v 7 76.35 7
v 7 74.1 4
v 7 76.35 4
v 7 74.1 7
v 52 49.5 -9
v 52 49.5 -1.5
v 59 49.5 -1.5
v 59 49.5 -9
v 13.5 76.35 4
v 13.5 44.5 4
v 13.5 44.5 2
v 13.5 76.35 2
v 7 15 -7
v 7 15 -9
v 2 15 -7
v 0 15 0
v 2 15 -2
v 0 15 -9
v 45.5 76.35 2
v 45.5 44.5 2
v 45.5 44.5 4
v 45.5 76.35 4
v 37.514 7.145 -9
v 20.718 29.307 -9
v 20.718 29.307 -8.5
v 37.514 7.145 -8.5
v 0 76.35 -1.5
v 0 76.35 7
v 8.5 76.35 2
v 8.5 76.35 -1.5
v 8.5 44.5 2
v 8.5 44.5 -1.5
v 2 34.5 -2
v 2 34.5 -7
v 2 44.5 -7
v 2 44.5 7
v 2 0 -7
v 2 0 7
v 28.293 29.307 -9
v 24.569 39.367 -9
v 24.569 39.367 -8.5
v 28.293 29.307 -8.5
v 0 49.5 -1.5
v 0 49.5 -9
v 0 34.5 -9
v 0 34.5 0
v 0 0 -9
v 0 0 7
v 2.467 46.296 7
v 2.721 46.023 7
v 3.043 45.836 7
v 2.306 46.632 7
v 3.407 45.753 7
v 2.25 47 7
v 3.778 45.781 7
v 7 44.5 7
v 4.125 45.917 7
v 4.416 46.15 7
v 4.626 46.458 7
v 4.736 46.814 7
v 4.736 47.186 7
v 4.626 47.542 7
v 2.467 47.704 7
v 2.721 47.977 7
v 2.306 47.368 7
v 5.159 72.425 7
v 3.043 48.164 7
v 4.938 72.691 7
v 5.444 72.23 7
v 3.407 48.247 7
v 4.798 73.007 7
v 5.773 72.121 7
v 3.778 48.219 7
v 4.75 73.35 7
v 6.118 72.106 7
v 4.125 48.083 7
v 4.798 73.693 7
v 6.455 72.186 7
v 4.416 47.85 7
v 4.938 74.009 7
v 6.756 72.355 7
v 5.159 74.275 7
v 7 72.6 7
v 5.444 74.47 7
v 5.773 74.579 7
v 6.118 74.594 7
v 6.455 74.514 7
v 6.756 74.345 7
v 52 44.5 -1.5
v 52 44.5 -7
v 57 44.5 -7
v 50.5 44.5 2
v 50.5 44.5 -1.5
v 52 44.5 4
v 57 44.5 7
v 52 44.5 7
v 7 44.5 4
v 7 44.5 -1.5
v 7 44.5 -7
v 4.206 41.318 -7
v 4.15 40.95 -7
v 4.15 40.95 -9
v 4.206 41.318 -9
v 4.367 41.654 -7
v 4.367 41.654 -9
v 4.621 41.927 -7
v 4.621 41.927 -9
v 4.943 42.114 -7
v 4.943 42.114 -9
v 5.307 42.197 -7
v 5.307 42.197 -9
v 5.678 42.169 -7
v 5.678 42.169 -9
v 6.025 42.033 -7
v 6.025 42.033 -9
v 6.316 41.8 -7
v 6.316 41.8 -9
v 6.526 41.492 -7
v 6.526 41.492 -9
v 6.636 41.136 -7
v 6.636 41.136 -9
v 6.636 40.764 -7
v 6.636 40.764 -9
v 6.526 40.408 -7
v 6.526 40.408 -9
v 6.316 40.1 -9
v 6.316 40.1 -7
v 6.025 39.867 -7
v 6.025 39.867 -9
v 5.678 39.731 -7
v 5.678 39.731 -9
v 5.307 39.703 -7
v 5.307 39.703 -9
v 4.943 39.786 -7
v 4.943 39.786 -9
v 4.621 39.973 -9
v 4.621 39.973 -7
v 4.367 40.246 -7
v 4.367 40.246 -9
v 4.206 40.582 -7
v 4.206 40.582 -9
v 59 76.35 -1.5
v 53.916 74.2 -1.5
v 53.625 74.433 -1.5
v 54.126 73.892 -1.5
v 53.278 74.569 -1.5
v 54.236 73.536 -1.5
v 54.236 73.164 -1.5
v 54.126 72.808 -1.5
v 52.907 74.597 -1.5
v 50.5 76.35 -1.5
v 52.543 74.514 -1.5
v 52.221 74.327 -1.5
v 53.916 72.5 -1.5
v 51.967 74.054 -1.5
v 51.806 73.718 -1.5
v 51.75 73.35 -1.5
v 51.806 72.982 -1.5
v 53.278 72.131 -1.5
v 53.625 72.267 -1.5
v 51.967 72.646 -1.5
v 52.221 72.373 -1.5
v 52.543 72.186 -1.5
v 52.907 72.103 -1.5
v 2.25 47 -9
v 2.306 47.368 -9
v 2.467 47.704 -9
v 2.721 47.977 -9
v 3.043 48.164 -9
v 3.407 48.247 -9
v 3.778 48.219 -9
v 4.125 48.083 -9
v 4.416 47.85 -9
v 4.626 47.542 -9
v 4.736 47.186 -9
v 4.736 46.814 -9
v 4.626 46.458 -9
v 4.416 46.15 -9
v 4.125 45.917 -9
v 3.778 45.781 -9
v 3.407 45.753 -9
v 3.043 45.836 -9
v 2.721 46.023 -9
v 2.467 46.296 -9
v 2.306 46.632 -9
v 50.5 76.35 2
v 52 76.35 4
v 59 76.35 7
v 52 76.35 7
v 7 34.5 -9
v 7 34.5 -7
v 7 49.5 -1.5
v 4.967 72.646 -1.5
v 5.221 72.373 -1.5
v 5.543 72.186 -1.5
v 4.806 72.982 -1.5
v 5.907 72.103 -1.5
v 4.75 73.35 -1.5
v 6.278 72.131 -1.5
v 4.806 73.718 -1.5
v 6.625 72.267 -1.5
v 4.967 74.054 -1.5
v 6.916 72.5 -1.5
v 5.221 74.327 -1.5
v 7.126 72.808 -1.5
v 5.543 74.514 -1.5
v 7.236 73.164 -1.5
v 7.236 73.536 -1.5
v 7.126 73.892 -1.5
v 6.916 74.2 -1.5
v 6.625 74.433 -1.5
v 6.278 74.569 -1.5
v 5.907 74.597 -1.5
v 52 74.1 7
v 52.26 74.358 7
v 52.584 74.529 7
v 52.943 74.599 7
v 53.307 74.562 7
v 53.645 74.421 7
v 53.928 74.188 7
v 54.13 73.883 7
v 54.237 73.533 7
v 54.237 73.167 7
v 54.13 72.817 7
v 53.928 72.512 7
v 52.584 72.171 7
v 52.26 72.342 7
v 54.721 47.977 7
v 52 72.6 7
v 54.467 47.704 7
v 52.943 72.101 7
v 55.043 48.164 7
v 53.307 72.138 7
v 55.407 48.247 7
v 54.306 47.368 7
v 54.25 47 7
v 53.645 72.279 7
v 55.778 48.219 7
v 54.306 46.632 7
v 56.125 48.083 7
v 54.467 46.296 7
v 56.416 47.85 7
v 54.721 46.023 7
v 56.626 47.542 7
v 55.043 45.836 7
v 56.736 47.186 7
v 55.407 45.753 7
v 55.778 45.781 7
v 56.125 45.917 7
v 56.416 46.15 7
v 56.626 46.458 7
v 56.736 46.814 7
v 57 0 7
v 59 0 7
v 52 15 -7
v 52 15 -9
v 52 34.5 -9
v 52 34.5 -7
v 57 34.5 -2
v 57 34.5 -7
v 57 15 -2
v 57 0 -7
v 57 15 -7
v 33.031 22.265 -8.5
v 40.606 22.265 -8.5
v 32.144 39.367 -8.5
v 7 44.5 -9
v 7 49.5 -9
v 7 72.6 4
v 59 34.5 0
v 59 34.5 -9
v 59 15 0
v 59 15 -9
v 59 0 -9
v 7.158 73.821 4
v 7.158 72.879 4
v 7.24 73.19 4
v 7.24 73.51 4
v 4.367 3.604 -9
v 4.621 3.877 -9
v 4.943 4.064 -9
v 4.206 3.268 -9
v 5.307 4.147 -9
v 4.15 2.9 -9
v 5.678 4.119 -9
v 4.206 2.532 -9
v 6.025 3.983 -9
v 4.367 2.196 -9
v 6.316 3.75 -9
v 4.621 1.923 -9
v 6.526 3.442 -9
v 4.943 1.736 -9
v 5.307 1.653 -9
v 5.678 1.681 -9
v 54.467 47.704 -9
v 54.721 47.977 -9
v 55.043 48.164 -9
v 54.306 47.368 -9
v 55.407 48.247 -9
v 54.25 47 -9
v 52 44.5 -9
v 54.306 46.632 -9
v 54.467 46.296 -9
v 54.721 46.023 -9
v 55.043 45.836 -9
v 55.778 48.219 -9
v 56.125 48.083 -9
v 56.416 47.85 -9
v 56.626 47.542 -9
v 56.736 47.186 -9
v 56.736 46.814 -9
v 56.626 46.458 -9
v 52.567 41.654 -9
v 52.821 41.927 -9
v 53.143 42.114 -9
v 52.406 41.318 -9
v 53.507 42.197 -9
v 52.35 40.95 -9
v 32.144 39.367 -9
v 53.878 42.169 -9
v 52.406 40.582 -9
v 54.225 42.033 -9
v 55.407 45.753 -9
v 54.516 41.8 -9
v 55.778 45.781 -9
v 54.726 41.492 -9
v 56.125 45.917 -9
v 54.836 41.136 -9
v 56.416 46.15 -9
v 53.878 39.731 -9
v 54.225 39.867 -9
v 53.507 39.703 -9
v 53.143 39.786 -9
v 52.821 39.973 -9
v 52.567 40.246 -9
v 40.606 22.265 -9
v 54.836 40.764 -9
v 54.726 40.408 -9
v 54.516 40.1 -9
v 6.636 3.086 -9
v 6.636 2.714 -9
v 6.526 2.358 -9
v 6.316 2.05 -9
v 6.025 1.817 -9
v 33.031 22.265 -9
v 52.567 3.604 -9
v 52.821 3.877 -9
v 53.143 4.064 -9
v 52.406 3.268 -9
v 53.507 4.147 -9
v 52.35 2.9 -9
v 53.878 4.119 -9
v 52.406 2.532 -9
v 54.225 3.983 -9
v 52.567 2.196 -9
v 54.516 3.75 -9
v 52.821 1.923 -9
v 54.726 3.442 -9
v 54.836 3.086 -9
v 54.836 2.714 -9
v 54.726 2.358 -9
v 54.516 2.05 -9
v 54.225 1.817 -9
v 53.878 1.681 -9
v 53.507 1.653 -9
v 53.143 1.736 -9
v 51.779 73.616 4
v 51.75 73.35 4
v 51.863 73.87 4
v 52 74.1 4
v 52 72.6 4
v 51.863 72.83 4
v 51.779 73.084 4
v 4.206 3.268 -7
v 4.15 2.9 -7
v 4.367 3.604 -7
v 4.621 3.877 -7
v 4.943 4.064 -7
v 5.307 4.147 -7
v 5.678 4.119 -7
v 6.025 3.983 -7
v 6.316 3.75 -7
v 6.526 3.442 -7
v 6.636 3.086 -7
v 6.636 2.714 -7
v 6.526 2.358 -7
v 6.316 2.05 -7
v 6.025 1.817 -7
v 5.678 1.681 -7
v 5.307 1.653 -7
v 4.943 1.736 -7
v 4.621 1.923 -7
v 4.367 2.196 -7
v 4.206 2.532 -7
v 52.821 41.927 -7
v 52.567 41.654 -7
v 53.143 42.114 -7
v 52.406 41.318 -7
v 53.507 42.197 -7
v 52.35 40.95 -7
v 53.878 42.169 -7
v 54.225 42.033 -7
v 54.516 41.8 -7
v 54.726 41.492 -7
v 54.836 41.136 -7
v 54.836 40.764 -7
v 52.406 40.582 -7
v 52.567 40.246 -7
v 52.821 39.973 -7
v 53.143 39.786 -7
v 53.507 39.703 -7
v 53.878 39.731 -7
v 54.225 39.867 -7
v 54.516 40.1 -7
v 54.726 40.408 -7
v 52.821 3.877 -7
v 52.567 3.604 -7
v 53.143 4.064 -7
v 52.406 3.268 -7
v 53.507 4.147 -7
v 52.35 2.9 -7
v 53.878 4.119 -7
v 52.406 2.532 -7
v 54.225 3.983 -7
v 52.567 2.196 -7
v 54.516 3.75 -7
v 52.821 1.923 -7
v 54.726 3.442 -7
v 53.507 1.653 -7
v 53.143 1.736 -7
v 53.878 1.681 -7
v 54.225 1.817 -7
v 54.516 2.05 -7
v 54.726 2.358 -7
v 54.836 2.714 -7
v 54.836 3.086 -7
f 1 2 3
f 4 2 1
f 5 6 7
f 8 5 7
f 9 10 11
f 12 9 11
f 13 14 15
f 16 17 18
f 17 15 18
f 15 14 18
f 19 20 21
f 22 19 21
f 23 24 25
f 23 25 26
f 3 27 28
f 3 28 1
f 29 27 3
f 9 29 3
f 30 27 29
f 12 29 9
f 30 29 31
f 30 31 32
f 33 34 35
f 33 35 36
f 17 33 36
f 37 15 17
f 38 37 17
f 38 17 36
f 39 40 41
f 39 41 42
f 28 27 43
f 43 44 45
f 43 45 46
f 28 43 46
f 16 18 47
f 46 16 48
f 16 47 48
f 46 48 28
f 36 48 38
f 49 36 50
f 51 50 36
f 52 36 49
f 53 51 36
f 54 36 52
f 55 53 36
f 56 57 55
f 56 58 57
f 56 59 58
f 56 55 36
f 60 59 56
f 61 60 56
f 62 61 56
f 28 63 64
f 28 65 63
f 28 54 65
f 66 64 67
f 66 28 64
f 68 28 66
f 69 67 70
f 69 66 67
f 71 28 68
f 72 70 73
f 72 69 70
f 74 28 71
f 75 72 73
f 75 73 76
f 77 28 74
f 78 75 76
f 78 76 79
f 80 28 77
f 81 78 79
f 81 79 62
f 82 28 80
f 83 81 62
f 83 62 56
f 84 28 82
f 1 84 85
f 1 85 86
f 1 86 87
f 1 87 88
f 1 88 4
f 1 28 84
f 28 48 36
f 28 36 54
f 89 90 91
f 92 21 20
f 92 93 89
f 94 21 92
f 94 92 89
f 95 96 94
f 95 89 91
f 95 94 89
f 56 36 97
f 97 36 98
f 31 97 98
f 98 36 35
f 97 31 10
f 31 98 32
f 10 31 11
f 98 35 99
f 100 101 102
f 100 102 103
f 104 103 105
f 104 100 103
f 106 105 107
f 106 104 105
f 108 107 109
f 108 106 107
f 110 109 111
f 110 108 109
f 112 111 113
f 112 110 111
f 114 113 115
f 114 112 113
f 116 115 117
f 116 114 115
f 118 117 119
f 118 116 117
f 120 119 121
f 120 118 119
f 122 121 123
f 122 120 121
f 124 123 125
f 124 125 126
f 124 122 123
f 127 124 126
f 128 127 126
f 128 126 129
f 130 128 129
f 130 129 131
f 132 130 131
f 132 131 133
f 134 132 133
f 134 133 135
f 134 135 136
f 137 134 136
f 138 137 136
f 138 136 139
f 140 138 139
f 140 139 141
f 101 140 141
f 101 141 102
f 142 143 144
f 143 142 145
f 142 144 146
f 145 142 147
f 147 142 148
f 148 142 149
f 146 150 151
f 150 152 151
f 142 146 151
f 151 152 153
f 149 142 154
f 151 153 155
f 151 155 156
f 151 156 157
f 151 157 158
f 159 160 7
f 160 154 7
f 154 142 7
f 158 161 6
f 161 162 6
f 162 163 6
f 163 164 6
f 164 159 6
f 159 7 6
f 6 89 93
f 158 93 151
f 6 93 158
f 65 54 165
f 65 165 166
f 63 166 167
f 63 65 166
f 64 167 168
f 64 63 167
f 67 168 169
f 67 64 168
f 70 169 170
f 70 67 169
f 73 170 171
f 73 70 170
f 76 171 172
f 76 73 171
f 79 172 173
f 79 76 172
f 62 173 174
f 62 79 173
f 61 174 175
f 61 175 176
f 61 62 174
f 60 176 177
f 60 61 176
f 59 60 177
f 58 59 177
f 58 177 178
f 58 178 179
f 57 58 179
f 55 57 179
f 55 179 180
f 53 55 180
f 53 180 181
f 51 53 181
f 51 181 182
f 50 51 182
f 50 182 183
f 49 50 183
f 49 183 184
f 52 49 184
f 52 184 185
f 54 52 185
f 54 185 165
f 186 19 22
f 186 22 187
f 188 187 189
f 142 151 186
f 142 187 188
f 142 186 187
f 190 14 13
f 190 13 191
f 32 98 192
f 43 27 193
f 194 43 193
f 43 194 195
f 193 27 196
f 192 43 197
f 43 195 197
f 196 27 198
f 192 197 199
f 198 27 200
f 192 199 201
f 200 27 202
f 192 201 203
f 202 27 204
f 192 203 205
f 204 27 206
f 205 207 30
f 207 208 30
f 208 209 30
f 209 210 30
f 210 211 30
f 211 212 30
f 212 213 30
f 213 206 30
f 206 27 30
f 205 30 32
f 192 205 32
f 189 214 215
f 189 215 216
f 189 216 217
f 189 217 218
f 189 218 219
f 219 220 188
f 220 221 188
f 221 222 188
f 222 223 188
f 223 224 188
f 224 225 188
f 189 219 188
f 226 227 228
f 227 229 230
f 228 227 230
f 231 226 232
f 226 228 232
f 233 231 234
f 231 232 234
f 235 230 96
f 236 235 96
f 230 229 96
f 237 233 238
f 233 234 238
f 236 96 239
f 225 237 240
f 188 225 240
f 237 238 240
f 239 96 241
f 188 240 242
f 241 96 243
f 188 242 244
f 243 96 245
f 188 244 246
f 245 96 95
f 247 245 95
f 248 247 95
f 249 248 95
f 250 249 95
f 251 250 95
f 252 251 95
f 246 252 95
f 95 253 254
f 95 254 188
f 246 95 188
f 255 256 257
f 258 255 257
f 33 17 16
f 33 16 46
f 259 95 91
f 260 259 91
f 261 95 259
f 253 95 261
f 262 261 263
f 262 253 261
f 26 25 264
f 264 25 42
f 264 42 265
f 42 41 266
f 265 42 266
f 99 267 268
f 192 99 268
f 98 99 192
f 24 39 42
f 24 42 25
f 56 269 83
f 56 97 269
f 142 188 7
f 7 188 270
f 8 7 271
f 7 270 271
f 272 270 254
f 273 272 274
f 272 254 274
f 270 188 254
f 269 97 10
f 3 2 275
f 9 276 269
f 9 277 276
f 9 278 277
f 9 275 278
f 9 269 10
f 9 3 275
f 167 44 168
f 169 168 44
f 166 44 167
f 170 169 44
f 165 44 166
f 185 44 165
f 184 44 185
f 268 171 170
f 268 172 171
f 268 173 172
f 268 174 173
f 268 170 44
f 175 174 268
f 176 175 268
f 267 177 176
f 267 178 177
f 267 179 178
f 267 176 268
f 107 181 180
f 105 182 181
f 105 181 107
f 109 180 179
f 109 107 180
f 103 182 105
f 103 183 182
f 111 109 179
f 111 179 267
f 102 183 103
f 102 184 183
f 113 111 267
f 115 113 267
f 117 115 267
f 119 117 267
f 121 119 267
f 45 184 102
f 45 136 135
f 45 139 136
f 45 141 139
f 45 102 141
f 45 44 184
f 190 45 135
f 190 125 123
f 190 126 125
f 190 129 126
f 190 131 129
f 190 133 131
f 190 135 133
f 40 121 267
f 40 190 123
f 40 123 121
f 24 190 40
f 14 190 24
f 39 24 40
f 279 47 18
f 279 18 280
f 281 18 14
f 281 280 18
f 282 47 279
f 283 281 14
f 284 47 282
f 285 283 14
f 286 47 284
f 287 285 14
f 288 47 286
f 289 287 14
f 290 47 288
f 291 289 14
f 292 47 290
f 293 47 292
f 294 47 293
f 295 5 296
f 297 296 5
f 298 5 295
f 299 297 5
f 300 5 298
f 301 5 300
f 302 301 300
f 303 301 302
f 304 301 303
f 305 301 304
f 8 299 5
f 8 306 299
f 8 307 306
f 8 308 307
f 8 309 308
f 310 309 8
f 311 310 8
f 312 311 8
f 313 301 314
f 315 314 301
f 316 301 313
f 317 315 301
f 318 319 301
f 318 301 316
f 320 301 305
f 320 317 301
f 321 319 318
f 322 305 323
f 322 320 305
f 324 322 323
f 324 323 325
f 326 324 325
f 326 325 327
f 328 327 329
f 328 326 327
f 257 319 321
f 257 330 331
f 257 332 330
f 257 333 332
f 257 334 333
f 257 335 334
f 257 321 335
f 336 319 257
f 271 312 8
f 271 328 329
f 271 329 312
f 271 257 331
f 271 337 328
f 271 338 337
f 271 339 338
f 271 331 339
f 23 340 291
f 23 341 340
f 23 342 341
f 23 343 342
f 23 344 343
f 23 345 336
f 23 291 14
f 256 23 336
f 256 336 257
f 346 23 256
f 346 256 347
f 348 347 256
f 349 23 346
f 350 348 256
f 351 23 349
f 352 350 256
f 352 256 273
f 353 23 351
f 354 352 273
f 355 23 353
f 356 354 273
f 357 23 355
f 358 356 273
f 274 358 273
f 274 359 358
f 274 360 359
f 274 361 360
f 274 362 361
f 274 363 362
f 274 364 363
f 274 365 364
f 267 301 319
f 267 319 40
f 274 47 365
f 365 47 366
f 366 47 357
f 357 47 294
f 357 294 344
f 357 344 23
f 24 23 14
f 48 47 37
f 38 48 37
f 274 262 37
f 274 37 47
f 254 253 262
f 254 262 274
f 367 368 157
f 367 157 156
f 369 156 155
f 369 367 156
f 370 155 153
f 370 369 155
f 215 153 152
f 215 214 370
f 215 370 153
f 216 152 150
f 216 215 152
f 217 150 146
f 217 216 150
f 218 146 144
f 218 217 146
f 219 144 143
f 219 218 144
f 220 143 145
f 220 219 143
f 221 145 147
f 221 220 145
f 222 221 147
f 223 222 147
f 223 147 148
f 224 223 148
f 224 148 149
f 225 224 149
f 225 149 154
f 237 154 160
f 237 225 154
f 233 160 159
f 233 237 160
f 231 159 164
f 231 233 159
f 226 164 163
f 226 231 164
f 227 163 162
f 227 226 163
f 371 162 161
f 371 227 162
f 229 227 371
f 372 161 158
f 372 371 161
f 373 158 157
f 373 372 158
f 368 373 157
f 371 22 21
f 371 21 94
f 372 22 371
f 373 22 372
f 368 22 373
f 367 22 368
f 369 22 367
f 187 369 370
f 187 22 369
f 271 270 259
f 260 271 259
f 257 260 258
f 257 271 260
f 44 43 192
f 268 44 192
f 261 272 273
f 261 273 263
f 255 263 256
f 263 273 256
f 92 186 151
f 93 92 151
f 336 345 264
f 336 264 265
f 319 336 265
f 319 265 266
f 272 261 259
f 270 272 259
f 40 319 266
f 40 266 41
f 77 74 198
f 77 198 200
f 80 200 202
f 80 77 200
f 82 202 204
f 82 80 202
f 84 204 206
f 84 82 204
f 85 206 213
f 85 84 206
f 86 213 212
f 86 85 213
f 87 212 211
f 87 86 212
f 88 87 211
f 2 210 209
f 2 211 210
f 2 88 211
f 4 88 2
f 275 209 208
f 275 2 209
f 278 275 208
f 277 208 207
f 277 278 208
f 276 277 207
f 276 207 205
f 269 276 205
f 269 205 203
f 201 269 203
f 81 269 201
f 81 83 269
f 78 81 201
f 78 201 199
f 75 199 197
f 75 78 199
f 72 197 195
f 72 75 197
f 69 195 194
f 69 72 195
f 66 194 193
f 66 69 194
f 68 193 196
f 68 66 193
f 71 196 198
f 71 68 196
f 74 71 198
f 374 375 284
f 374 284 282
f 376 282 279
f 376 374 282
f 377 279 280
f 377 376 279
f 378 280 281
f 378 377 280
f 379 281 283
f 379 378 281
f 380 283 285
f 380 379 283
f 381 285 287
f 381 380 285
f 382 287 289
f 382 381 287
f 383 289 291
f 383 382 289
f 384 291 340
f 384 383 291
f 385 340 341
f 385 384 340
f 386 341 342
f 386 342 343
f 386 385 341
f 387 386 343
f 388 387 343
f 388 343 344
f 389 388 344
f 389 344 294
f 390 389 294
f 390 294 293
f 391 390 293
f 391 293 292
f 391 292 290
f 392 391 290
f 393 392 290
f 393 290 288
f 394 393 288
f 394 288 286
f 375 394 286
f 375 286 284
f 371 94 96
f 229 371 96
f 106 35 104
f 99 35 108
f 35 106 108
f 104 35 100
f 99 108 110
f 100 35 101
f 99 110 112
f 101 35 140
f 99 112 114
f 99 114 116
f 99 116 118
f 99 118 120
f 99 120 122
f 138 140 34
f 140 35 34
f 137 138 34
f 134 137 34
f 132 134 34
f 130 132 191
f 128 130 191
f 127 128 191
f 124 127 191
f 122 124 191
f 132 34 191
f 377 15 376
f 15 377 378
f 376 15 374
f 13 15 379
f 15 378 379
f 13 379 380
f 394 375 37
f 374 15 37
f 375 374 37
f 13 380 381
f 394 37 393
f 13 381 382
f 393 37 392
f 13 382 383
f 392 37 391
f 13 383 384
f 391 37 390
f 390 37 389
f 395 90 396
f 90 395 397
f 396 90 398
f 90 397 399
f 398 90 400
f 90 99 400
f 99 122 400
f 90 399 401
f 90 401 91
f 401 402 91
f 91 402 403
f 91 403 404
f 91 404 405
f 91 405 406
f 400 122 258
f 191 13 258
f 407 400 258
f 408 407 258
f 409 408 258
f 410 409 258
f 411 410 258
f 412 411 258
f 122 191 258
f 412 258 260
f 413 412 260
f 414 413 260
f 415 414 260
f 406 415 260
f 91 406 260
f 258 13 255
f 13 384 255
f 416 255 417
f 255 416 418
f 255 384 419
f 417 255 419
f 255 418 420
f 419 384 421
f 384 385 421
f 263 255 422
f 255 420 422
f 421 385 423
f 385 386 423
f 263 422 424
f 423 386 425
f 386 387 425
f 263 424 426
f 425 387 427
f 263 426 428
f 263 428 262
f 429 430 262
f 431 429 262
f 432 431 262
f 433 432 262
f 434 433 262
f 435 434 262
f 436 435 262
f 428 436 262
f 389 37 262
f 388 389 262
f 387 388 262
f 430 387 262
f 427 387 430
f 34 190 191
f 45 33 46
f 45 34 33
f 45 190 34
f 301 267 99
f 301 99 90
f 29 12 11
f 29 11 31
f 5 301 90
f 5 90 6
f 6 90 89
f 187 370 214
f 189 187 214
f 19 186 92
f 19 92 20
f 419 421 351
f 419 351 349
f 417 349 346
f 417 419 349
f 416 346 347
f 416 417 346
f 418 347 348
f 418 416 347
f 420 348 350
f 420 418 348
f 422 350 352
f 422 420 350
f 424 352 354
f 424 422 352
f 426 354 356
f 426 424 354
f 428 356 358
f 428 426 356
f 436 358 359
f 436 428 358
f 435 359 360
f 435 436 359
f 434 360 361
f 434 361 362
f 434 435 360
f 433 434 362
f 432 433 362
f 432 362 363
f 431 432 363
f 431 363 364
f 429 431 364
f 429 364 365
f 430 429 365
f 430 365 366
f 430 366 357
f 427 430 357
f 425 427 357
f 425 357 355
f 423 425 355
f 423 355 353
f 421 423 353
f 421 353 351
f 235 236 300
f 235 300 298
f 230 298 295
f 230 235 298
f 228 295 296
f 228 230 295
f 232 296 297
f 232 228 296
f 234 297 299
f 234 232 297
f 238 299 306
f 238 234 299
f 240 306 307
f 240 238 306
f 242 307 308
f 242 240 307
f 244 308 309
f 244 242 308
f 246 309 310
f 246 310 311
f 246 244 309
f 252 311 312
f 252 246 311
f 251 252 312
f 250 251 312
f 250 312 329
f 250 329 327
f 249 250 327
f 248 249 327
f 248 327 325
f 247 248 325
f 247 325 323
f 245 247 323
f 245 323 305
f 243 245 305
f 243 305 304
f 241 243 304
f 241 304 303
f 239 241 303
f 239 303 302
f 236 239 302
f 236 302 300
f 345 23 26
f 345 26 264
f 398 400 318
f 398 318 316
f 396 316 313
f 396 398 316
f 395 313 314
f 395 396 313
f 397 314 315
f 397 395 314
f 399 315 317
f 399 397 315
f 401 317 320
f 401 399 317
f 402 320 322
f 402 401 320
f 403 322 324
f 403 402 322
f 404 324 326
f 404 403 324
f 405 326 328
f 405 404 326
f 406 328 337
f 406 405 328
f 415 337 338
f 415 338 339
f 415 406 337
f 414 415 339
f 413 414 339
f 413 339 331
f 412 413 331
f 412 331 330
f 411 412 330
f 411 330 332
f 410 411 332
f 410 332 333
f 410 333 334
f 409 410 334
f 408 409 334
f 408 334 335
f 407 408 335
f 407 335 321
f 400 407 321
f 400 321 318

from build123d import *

# Parameters (mm, degrees)
BOSS_EXTRUDE1_DEPTH     = 44.5
SKETCH4_W               = 7
SKETCH4_H               = 9
BOSS_EXTRUDE3_DEPTH     = 5
SKETCH5_R               = 1.25
CUT_EXTRUDE3_DEPTH      = 78.538700015
BOSS_EXTRUDE4_DEPTH     = 3
SKETCH10_W              = 7
SKETCH10_H              = 19.5
CUT_EXTRUDE6_DEPTH      = 7
CHAMFER3_SIZE           = 2
CUT_EXTRUDE5_DEPTH      = 78.538700015
CUT_EXTRUDE5_DEPTH_BACK = 78.538700015
SKETCH9_W               = 59
SKETCH9_H               = 2
CUT_EXTRUDE7_DEPTH      = 0.5
SKETCH12_W              = 7
SKETCH12_H              = 2
SKETCH12_W_2            = 1.5
SKETCH12_H_2            = 3.5
SKETCH12_H_3            = 3
BOSS_EXTRUDE5_DEPTH     = 26.85
CUT_EXTRUDE4_START      = -16
CUT_EXTRUDE4_OUTLINE_R  = 1.25
CUT_EXTRUDE4_DEPTH      = 16
SKETCH12_4_W            = 1.5
SKETCH12_4_H            = 3.5
BOSS_EXTRUDE6_DEPTH     = 5


# Read off the part's stored shape, not the designer's step: Cut-Extrude4
with BuildPart() as part:
    # Sketch1 → Boss-Extrude1 (new body)
    with BuildSketch(Plane(origin=(0, 0, 0), x_dir=(1, 0, 0), z_dir=(0, 1, 0))):
        Polygon((0, 0), (2, 0), (2, 7), (57, 7), (57, 0), (59, 0), (59, 9), (0, 9), align=None)
    extrude(amount=BOSS_EXTRUDE1_DEPTH)

    # Sketch4 → Boss-Extrude3 (add)
    with BuildSketch(Plane(origin=(0, 44.5, 0), x_dir=(1, 0, 0), z_dir=(0, 1, 0))):
        with Locations((3.5, 4.5)):
            Rectangle(SKETCH4_W, SKETCH4_H)
        with Locations((55.5, 4.5)):
            Rectangle(SKETCH4_W, SKETCH4_H)
    extrude(amount=BOSS_EXTRUDE3_DEPTH)

    # Sketch5 → Cut-Extrude3 (cut, through all)
    with BuildSketch(Plane(origin=(0, 0, -9), x_dir=(-1, 0, 0), z_dir=(0, 0, -1))):
        with Locations((-55.5, 47)):
            Circle(SKETCH5_R)
        with Locations((-3.5, 47)):
            Circle(SKETCH5_R)
    extrude(amount=-CUT_EXTRUDE3_DEPTH, mode=Mode.SUBTRACT)

    # Sketch3 → Boss-Extrude4 (add)
    with BuildSketch(Plane(origin=(0, 0, -9), x_dir=(-1, 0, 0), z_dir=(0, 0, -1))):
        with BuildLine():
            ThreePointArc((1.75, 5), (1.184653197, 6.045825033), (0, 6.145643924))
            Line((0, 6.145643924), (0, 3.854356076))
            ThreePointArc((0, 3.854356076), (1.184653197, 3.954174967), (1.75, 5))
        make_face()
        with BuildLine():
            Line((-59, 3.854356076), (-59, 6.145643924))
            ThreePointArc((-59, 6.145643924), (-60.75, 5), (-59, 3.854356076))
        make_face()
    extrude(amount=BOSS_EXTRUDE4_DEPTH)


with BuildPart() as boss_extrude4_kept_piece:
    # of the separate pieces the step leaves, the one the design keeps (boss_extrude4_pieces_kept)
    add(part.part.solids().sort_by_distance((0, 49.5, 0))[0])

    # Mirror2: Boss-Extrude4 kept piece across plane


with BuildPart() as boss_extrude4_kept_piece_1:
    add(boss_extrude4_kept_piece.part)
    add(boss_extrude4_kept_piece.part.mirror(Plane.XY))

    # Sketch10 → Cut-Extrude6 (cut)
    with BuildSketch(Plane(origin=(0, 0, -9), x_dir=(-1, 0, 0), z_dir=(0, 0, -1))):
        with Locations((-55.5, 24.75)):
            Rectangle(SKETCH10_W, SKETCH10_H)
        with Locations((-3.5, 24.75)):
            Rectangle(SKETCH10_W, SKETCH10_H)
    extrude(amount=-CUT_EXTRUDE6_DEPTH, mode=Mode.SUBTRACT)

    # Chamfer3
    chamfer3_edges = [boss_extrude4_kept_piece_1.edges().sort_by_distance(p)[0] for p in [
        (0, 24.75, -2),
        (59, 24.75, -2),
    ]]
    chamfer(chamfer3_edges, length=CHAMFER3_SIZE - 0.0001)  # a hair under: the kernel refuses the full size

    # Sketch9 → Cut-Extrude5 (cut, two sides: drawn at the far end of the back side and taken through both)
    with BuildSketch(Plane.XZ.offset(-CUT_EXTRUDE5_DEPTH_BACK)):
        with Locations((29.5, 8)):
            Rectangle(SKETCH9_W, SKETCH9_H)
    extrude(amount=CUT_EXTRUDE5_DEPTH + CUT_EXTRUDE5_DEPTH_BACK, mode=Mode.SUBTRACT)

    # Sketch11 → Cut-Extrude7 (cut)
    with BuildSketch(Plane(origin=(0, 0, -9), x_dir=(-1, 0, 0), z_dir=(0, 0, -1))):
        Polygon((-32.1435681, 39.366852384), (-24.568842978, 39.366852384), (-28.293120049, 29.306670581), (-20.718394926, 29.306670581), (-37.51393239, 7.144924052), (-33.031231201, 22.264543319), (-40.605956323, 22.264543319), align=None)
    extrude(amount=-CUT_EXTRUDE7_DEPTH, mode=Mode.SUBTRACT)

    # Sketch12 → Boss-Extrude5 (add)
    with BuildSketch(Plane(origin=(0, 49.5, 0), x_dir=(1, 0, 0), z_dir=(0, 1, 0))):
        with Locations((55.5, -3)):
            Rectangle(SKETCH12_W, SKETCH12_H)
        Polygon((7, -2), (7, -4), (13.5, -4), (13.5, -2), (8.5, -2), align=None)
        Polygon((45.5, -2), (45.5, -4), (52, -4), (52, -2), (50.5, -2), align=None)
        with Locations((7.75, -0.25)):
            Rectangle(SKETCH12_W_2, SKETCH12_H_2)
        with Locations((3.5, -0.25)):
            Rectangle(SKETCH12_W, SKETCH12_H_2)
        with Locations((51.25, -0.25)):
            Rectangle(SKETCH12_W_2, SKETCH12_H_2)
        with Locations((55.5, -0.25)):
            Rectangle(SKETCH12_W, SKETCH12_H_2)
        with Locations((3.5, -3)):
            Rectangle(SKETCH12_W, SKETCH12_H)
        with Locations((3.5, -5.5)):
            Rectangle(SKETCH12_W, SKETCH12_H_3)
        with Locations((55.5, -5.5)):
            Rectangle(SKETCH12_W, SKETCH12_H_3)
    extrude(amount=BOSS_EXTRUDE5_DEPTH)

    # Cut-Extrude4 outline → Cut-Extrude4 (cut)
    with BuildSketch(Plane(origin=(0, 0, -9), x_dir=(-1, 0, 0), z_dir=(0, 0, -1)).offset(CUT_EXTRUDE4_START)):
        with Locations((-53, 73.35)):
            Circle(CUT_EXTRUDE4_OUTLINE_R)
        with Locations((-6, 73.35)):
            Circle(CUT_EXTRUDE4_OUTLINE_R)
        with Locations((-53.6, 40.95)):
            Circle(CUT_EXTRUDE4_OUTLINE_R)
        with Locations((-5.4, 40.95)):
            Circle(CUT_EXTRUDE4_OUTLINE_R)
        with Locations((-5.4, 2.9)):
            Circle(CUT_EXTRUDE4_OUTLINE_R)
        with Locations((-53.6, 2.9)):
            Circle(CUT_EXTRUDE4_OUTLINE_R)
    extrude(amount=CUT_EXTRUDE4_DEPTH, mode=Mode.SUBTRACT)

    # Sketch12<4> → Boss-Extrude6 (add)
    with BuildSketch(Plane(origin=(0, 49.5, 0), x_dir=(1, 0, 0), z_dir=(0, 1, 0))):
        Polygon((7, -2), (7, -4), (13.5, -4), (13.5, -2), (8.5, -2), align=None)
        Polygon((45.5, -2), (45.5, -4), (52, -4), (52, -2), (50.5, -2), align=None)
        with Locations((7.75, -0.25)):
            Rectangle(SKETCH12_4_W, SKETCH12_4_H)
        with Locations((51.25, -0.25)):
            Rectangle(SKETCH12_4_W, SKETCH12_4_H)
    extrude(amount=-BOSS_EXTRUDE6_DEPTH)


solid = boss_extrude4_kept_piece_1.part
